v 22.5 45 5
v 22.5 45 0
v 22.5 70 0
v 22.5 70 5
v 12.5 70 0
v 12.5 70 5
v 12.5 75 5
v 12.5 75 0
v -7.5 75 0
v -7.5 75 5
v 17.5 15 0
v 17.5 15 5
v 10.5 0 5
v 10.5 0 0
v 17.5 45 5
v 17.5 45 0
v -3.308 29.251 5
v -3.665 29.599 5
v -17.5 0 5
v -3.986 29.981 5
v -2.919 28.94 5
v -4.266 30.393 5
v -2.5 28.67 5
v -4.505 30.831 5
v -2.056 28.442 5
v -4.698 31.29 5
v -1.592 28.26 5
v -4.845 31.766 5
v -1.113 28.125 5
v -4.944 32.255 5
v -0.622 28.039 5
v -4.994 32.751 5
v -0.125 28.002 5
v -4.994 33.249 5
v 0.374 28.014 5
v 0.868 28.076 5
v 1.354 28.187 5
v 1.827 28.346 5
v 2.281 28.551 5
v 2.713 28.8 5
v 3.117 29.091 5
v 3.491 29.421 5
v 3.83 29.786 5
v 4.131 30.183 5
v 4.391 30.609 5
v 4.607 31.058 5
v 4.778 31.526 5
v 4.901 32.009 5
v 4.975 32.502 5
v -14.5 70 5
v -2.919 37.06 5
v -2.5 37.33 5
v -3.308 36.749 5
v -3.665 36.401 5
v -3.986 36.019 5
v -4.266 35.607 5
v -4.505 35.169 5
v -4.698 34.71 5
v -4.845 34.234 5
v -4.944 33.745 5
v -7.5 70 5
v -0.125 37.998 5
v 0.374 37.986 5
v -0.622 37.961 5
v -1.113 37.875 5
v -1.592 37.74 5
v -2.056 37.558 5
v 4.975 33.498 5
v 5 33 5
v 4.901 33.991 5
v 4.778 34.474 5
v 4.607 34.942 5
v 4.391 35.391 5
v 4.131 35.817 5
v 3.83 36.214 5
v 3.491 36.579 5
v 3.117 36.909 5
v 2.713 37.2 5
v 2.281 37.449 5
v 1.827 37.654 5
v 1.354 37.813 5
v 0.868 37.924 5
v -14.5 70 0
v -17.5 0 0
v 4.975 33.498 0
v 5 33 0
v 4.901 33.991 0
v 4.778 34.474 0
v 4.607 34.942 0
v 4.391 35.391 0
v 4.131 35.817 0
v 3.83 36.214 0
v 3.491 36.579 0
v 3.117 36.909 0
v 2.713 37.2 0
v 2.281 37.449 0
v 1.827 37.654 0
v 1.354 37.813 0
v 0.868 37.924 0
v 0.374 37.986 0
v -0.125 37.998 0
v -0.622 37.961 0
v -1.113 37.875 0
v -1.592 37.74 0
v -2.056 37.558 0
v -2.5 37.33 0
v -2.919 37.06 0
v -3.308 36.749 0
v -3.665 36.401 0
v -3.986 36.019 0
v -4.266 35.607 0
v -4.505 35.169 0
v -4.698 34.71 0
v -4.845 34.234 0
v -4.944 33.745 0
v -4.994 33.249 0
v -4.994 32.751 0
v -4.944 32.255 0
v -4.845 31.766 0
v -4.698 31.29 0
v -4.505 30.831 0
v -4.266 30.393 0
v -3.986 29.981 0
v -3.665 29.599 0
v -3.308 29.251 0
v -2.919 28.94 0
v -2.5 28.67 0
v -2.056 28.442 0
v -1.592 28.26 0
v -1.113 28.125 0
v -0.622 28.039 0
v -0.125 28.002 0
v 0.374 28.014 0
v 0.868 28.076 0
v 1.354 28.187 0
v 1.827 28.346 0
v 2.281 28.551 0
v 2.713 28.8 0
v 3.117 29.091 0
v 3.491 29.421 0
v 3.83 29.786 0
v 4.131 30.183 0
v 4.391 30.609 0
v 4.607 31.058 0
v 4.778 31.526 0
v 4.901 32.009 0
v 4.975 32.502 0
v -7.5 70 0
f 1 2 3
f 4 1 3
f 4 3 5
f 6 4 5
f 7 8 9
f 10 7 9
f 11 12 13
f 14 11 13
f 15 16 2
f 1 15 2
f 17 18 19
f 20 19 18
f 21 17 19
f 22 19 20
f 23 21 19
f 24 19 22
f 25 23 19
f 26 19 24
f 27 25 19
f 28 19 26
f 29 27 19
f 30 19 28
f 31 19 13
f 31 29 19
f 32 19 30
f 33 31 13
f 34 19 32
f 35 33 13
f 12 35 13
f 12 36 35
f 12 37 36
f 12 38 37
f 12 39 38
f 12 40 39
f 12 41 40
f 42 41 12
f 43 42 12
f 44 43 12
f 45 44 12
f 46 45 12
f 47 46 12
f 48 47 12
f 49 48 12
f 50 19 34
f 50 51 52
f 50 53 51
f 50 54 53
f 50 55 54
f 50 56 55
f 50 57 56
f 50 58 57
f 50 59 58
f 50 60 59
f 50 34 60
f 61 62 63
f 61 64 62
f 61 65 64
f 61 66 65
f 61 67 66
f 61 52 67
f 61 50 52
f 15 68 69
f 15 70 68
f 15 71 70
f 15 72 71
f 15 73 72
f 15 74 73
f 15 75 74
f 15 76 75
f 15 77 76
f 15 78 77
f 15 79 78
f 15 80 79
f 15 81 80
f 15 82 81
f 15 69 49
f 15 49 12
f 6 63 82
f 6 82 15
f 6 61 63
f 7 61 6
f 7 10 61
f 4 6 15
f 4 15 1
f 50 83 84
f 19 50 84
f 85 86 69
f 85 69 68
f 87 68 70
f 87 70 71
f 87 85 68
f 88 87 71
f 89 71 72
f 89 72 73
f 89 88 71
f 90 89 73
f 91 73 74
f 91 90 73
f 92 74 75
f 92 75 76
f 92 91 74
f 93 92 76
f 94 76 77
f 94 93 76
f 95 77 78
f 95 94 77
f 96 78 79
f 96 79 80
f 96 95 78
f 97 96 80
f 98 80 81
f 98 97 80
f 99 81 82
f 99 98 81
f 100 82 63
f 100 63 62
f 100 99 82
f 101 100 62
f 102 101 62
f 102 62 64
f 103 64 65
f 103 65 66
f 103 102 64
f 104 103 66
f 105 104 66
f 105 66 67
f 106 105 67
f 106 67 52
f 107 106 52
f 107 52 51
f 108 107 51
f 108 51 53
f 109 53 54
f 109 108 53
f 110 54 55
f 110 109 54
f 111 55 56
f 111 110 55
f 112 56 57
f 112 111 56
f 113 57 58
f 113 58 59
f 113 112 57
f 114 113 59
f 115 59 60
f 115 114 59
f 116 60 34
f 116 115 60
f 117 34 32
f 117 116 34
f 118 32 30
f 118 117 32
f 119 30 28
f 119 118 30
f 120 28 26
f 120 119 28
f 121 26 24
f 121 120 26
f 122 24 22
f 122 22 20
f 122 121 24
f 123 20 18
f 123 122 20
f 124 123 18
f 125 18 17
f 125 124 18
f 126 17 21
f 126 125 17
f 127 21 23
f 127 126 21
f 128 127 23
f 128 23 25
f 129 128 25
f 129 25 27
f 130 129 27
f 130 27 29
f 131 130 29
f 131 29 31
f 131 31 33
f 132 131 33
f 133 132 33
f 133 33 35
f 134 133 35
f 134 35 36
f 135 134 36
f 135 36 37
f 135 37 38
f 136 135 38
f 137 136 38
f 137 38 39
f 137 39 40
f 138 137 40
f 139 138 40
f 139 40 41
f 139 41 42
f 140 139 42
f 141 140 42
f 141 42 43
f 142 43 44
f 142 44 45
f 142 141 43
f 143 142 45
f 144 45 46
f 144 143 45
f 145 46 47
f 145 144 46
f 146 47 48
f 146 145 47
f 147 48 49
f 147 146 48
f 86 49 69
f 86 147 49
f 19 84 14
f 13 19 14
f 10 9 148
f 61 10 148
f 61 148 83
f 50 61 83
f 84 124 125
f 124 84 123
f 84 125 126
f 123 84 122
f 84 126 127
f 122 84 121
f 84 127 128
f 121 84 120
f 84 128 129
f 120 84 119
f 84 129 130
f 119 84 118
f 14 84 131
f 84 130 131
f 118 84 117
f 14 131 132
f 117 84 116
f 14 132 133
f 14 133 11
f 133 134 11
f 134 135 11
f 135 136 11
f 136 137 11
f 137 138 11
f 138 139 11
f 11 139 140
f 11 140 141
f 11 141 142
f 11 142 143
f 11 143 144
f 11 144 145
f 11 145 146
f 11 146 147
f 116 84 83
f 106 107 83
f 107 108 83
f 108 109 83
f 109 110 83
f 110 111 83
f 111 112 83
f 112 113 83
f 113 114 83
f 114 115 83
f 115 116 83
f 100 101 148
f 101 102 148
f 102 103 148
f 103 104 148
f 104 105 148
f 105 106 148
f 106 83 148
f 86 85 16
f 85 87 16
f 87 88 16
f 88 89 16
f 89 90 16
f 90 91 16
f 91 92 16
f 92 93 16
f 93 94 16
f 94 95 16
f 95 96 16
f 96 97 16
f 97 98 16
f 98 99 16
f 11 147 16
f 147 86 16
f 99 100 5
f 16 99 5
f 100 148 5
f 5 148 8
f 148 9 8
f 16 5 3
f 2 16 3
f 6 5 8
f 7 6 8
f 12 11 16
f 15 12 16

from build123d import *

# Parameters (mm, degrees)
F0_R     = 5
F1_DEPTH = 5
F3_DEPTH = 25


with BuildPart() as f1:
    # F0 (on Top) → F1 (new body)
    with BuildSketch(Plane.XY):
        Polygon((-7.5, 70), (-14.5, 70), (-17.5, 0), (22.5, 0), (22.5, 15), (17.5, 15), (17.5, 45), (22.5, 45), (22.5, 70), (12.5, 70), (12.5, 75), (-7.5, 75), align=None)
        with Locations((0, 33)):
            Circle(F0_R, mode=Mode.SUBTRACT)
    extrude(amount=F1_DEPTH)

    # F2 (on face) → F3 (cut)
    with BuildSketch(Plane.XY.offset(5)):
        Polygon((17.5, 15), (10.5, 0), (22.5, 0), (22.5, 15), align=None)
    extrude(amount=-F3_DEPTH, mode=Mode.SUBTRACT)


solid = f1.part
